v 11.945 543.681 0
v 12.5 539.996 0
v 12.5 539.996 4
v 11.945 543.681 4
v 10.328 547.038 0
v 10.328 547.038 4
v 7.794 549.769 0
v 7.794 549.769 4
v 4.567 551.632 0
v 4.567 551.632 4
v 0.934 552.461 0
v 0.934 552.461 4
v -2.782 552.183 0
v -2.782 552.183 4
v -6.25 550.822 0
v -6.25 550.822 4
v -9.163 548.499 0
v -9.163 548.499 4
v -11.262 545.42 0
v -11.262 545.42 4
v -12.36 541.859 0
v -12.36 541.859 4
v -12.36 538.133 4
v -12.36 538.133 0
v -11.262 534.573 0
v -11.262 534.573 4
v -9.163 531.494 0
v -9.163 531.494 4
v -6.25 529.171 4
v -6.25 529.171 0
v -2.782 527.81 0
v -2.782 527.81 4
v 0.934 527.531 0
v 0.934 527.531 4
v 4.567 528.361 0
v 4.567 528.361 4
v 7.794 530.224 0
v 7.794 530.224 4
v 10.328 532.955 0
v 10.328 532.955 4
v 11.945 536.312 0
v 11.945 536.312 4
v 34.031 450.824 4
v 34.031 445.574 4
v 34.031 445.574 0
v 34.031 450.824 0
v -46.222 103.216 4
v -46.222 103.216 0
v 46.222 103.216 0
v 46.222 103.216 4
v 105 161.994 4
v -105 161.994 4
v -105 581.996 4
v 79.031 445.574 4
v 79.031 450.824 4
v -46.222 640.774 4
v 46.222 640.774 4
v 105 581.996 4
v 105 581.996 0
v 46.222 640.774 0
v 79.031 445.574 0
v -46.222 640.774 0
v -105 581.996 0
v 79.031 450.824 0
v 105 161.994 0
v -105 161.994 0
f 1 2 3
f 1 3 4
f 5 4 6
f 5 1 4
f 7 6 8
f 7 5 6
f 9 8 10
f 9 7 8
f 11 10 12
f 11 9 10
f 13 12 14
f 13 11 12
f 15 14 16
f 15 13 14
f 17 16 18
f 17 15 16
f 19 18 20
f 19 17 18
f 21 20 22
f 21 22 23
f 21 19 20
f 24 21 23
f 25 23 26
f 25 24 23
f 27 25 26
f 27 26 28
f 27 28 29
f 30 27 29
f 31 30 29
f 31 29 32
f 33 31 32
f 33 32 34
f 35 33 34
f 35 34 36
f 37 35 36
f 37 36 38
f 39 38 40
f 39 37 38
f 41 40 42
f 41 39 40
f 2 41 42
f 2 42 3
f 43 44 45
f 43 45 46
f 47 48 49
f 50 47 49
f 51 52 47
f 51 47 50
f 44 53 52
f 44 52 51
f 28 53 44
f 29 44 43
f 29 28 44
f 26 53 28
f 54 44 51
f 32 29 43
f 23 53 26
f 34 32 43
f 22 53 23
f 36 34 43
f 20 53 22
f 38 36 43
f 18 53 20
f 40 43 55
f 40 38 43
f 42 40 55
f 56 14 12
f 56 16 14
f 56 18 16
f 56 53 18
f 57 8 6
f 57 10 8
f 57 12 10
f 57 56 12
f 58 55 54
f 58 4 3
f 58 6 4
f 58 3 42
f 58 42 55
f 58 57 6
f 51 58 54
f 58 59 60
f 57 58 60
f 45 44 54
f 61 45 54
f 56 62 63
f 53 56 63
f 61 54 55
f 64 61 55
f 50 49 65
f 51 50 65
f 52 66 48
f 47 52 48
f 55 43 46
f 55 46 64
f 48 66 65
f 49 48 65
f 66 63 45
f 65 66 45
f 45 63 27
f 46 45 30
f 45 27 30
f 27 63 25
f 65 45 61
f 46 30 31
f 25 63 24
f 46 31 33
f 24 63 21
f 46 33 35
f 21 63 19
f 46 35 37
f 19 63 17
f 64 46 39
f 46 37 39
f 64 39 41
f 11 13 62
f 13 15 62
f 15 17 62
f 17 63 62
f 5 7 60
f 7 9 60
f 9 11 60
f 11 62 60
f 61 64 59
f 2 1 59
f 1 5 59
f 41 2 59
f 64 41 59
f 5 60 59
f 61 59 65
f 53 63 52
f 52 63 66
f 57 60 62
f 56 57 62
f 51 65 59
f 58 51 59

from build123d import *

# Parameters (mm, degrees)
SKETCH_1_R          = 12.5
EXTRUDE_1_DEPTH     = 4
SKETCH_2_W          = 45
SKETCH_2_H          = 5.25
CUT_EXTRUDE_1_DEPTH = 650.332288577


with BuildPart() as part:
    # Эскиз1 → Вытянуть1 (new body)
    with BuildSketch(Plane.XY):
        Polygon((-105, 539.996445798), (-105, 203.99388251), (-105, 161.99388251), (-46.222366275, 103.216248785), (46.222366275, 103.216248785), (105, 161.99388251), (105, 203.99388251), (105, 539.996445798), (105, 581.996445798), (46.222366275, 640.774079523), (-46.222366275, 640.774079523), (-105, 581.996445798), align=None)
        with Locations((0, 539.996445798)):
            Circle(SKETCH_1_R, mode=Mode.SUBTRACT)
    extrude(amount=EXTRUDE_1_DEPTH)

    # Эскиз2 → Вырез-Вытянуть1 (cut, through all)
    with BuildSketch(Plane.XY.offset(4)):
        with Locations((56.53130754, 448.199029203)):
            Rectangle(SKETCH_2_W, SKETCH_2_H)
    extrude(amount=-CUT_EXTRUDE_1_DEPTH, mode=Mode.SUBTRACT)


solid = part.part
